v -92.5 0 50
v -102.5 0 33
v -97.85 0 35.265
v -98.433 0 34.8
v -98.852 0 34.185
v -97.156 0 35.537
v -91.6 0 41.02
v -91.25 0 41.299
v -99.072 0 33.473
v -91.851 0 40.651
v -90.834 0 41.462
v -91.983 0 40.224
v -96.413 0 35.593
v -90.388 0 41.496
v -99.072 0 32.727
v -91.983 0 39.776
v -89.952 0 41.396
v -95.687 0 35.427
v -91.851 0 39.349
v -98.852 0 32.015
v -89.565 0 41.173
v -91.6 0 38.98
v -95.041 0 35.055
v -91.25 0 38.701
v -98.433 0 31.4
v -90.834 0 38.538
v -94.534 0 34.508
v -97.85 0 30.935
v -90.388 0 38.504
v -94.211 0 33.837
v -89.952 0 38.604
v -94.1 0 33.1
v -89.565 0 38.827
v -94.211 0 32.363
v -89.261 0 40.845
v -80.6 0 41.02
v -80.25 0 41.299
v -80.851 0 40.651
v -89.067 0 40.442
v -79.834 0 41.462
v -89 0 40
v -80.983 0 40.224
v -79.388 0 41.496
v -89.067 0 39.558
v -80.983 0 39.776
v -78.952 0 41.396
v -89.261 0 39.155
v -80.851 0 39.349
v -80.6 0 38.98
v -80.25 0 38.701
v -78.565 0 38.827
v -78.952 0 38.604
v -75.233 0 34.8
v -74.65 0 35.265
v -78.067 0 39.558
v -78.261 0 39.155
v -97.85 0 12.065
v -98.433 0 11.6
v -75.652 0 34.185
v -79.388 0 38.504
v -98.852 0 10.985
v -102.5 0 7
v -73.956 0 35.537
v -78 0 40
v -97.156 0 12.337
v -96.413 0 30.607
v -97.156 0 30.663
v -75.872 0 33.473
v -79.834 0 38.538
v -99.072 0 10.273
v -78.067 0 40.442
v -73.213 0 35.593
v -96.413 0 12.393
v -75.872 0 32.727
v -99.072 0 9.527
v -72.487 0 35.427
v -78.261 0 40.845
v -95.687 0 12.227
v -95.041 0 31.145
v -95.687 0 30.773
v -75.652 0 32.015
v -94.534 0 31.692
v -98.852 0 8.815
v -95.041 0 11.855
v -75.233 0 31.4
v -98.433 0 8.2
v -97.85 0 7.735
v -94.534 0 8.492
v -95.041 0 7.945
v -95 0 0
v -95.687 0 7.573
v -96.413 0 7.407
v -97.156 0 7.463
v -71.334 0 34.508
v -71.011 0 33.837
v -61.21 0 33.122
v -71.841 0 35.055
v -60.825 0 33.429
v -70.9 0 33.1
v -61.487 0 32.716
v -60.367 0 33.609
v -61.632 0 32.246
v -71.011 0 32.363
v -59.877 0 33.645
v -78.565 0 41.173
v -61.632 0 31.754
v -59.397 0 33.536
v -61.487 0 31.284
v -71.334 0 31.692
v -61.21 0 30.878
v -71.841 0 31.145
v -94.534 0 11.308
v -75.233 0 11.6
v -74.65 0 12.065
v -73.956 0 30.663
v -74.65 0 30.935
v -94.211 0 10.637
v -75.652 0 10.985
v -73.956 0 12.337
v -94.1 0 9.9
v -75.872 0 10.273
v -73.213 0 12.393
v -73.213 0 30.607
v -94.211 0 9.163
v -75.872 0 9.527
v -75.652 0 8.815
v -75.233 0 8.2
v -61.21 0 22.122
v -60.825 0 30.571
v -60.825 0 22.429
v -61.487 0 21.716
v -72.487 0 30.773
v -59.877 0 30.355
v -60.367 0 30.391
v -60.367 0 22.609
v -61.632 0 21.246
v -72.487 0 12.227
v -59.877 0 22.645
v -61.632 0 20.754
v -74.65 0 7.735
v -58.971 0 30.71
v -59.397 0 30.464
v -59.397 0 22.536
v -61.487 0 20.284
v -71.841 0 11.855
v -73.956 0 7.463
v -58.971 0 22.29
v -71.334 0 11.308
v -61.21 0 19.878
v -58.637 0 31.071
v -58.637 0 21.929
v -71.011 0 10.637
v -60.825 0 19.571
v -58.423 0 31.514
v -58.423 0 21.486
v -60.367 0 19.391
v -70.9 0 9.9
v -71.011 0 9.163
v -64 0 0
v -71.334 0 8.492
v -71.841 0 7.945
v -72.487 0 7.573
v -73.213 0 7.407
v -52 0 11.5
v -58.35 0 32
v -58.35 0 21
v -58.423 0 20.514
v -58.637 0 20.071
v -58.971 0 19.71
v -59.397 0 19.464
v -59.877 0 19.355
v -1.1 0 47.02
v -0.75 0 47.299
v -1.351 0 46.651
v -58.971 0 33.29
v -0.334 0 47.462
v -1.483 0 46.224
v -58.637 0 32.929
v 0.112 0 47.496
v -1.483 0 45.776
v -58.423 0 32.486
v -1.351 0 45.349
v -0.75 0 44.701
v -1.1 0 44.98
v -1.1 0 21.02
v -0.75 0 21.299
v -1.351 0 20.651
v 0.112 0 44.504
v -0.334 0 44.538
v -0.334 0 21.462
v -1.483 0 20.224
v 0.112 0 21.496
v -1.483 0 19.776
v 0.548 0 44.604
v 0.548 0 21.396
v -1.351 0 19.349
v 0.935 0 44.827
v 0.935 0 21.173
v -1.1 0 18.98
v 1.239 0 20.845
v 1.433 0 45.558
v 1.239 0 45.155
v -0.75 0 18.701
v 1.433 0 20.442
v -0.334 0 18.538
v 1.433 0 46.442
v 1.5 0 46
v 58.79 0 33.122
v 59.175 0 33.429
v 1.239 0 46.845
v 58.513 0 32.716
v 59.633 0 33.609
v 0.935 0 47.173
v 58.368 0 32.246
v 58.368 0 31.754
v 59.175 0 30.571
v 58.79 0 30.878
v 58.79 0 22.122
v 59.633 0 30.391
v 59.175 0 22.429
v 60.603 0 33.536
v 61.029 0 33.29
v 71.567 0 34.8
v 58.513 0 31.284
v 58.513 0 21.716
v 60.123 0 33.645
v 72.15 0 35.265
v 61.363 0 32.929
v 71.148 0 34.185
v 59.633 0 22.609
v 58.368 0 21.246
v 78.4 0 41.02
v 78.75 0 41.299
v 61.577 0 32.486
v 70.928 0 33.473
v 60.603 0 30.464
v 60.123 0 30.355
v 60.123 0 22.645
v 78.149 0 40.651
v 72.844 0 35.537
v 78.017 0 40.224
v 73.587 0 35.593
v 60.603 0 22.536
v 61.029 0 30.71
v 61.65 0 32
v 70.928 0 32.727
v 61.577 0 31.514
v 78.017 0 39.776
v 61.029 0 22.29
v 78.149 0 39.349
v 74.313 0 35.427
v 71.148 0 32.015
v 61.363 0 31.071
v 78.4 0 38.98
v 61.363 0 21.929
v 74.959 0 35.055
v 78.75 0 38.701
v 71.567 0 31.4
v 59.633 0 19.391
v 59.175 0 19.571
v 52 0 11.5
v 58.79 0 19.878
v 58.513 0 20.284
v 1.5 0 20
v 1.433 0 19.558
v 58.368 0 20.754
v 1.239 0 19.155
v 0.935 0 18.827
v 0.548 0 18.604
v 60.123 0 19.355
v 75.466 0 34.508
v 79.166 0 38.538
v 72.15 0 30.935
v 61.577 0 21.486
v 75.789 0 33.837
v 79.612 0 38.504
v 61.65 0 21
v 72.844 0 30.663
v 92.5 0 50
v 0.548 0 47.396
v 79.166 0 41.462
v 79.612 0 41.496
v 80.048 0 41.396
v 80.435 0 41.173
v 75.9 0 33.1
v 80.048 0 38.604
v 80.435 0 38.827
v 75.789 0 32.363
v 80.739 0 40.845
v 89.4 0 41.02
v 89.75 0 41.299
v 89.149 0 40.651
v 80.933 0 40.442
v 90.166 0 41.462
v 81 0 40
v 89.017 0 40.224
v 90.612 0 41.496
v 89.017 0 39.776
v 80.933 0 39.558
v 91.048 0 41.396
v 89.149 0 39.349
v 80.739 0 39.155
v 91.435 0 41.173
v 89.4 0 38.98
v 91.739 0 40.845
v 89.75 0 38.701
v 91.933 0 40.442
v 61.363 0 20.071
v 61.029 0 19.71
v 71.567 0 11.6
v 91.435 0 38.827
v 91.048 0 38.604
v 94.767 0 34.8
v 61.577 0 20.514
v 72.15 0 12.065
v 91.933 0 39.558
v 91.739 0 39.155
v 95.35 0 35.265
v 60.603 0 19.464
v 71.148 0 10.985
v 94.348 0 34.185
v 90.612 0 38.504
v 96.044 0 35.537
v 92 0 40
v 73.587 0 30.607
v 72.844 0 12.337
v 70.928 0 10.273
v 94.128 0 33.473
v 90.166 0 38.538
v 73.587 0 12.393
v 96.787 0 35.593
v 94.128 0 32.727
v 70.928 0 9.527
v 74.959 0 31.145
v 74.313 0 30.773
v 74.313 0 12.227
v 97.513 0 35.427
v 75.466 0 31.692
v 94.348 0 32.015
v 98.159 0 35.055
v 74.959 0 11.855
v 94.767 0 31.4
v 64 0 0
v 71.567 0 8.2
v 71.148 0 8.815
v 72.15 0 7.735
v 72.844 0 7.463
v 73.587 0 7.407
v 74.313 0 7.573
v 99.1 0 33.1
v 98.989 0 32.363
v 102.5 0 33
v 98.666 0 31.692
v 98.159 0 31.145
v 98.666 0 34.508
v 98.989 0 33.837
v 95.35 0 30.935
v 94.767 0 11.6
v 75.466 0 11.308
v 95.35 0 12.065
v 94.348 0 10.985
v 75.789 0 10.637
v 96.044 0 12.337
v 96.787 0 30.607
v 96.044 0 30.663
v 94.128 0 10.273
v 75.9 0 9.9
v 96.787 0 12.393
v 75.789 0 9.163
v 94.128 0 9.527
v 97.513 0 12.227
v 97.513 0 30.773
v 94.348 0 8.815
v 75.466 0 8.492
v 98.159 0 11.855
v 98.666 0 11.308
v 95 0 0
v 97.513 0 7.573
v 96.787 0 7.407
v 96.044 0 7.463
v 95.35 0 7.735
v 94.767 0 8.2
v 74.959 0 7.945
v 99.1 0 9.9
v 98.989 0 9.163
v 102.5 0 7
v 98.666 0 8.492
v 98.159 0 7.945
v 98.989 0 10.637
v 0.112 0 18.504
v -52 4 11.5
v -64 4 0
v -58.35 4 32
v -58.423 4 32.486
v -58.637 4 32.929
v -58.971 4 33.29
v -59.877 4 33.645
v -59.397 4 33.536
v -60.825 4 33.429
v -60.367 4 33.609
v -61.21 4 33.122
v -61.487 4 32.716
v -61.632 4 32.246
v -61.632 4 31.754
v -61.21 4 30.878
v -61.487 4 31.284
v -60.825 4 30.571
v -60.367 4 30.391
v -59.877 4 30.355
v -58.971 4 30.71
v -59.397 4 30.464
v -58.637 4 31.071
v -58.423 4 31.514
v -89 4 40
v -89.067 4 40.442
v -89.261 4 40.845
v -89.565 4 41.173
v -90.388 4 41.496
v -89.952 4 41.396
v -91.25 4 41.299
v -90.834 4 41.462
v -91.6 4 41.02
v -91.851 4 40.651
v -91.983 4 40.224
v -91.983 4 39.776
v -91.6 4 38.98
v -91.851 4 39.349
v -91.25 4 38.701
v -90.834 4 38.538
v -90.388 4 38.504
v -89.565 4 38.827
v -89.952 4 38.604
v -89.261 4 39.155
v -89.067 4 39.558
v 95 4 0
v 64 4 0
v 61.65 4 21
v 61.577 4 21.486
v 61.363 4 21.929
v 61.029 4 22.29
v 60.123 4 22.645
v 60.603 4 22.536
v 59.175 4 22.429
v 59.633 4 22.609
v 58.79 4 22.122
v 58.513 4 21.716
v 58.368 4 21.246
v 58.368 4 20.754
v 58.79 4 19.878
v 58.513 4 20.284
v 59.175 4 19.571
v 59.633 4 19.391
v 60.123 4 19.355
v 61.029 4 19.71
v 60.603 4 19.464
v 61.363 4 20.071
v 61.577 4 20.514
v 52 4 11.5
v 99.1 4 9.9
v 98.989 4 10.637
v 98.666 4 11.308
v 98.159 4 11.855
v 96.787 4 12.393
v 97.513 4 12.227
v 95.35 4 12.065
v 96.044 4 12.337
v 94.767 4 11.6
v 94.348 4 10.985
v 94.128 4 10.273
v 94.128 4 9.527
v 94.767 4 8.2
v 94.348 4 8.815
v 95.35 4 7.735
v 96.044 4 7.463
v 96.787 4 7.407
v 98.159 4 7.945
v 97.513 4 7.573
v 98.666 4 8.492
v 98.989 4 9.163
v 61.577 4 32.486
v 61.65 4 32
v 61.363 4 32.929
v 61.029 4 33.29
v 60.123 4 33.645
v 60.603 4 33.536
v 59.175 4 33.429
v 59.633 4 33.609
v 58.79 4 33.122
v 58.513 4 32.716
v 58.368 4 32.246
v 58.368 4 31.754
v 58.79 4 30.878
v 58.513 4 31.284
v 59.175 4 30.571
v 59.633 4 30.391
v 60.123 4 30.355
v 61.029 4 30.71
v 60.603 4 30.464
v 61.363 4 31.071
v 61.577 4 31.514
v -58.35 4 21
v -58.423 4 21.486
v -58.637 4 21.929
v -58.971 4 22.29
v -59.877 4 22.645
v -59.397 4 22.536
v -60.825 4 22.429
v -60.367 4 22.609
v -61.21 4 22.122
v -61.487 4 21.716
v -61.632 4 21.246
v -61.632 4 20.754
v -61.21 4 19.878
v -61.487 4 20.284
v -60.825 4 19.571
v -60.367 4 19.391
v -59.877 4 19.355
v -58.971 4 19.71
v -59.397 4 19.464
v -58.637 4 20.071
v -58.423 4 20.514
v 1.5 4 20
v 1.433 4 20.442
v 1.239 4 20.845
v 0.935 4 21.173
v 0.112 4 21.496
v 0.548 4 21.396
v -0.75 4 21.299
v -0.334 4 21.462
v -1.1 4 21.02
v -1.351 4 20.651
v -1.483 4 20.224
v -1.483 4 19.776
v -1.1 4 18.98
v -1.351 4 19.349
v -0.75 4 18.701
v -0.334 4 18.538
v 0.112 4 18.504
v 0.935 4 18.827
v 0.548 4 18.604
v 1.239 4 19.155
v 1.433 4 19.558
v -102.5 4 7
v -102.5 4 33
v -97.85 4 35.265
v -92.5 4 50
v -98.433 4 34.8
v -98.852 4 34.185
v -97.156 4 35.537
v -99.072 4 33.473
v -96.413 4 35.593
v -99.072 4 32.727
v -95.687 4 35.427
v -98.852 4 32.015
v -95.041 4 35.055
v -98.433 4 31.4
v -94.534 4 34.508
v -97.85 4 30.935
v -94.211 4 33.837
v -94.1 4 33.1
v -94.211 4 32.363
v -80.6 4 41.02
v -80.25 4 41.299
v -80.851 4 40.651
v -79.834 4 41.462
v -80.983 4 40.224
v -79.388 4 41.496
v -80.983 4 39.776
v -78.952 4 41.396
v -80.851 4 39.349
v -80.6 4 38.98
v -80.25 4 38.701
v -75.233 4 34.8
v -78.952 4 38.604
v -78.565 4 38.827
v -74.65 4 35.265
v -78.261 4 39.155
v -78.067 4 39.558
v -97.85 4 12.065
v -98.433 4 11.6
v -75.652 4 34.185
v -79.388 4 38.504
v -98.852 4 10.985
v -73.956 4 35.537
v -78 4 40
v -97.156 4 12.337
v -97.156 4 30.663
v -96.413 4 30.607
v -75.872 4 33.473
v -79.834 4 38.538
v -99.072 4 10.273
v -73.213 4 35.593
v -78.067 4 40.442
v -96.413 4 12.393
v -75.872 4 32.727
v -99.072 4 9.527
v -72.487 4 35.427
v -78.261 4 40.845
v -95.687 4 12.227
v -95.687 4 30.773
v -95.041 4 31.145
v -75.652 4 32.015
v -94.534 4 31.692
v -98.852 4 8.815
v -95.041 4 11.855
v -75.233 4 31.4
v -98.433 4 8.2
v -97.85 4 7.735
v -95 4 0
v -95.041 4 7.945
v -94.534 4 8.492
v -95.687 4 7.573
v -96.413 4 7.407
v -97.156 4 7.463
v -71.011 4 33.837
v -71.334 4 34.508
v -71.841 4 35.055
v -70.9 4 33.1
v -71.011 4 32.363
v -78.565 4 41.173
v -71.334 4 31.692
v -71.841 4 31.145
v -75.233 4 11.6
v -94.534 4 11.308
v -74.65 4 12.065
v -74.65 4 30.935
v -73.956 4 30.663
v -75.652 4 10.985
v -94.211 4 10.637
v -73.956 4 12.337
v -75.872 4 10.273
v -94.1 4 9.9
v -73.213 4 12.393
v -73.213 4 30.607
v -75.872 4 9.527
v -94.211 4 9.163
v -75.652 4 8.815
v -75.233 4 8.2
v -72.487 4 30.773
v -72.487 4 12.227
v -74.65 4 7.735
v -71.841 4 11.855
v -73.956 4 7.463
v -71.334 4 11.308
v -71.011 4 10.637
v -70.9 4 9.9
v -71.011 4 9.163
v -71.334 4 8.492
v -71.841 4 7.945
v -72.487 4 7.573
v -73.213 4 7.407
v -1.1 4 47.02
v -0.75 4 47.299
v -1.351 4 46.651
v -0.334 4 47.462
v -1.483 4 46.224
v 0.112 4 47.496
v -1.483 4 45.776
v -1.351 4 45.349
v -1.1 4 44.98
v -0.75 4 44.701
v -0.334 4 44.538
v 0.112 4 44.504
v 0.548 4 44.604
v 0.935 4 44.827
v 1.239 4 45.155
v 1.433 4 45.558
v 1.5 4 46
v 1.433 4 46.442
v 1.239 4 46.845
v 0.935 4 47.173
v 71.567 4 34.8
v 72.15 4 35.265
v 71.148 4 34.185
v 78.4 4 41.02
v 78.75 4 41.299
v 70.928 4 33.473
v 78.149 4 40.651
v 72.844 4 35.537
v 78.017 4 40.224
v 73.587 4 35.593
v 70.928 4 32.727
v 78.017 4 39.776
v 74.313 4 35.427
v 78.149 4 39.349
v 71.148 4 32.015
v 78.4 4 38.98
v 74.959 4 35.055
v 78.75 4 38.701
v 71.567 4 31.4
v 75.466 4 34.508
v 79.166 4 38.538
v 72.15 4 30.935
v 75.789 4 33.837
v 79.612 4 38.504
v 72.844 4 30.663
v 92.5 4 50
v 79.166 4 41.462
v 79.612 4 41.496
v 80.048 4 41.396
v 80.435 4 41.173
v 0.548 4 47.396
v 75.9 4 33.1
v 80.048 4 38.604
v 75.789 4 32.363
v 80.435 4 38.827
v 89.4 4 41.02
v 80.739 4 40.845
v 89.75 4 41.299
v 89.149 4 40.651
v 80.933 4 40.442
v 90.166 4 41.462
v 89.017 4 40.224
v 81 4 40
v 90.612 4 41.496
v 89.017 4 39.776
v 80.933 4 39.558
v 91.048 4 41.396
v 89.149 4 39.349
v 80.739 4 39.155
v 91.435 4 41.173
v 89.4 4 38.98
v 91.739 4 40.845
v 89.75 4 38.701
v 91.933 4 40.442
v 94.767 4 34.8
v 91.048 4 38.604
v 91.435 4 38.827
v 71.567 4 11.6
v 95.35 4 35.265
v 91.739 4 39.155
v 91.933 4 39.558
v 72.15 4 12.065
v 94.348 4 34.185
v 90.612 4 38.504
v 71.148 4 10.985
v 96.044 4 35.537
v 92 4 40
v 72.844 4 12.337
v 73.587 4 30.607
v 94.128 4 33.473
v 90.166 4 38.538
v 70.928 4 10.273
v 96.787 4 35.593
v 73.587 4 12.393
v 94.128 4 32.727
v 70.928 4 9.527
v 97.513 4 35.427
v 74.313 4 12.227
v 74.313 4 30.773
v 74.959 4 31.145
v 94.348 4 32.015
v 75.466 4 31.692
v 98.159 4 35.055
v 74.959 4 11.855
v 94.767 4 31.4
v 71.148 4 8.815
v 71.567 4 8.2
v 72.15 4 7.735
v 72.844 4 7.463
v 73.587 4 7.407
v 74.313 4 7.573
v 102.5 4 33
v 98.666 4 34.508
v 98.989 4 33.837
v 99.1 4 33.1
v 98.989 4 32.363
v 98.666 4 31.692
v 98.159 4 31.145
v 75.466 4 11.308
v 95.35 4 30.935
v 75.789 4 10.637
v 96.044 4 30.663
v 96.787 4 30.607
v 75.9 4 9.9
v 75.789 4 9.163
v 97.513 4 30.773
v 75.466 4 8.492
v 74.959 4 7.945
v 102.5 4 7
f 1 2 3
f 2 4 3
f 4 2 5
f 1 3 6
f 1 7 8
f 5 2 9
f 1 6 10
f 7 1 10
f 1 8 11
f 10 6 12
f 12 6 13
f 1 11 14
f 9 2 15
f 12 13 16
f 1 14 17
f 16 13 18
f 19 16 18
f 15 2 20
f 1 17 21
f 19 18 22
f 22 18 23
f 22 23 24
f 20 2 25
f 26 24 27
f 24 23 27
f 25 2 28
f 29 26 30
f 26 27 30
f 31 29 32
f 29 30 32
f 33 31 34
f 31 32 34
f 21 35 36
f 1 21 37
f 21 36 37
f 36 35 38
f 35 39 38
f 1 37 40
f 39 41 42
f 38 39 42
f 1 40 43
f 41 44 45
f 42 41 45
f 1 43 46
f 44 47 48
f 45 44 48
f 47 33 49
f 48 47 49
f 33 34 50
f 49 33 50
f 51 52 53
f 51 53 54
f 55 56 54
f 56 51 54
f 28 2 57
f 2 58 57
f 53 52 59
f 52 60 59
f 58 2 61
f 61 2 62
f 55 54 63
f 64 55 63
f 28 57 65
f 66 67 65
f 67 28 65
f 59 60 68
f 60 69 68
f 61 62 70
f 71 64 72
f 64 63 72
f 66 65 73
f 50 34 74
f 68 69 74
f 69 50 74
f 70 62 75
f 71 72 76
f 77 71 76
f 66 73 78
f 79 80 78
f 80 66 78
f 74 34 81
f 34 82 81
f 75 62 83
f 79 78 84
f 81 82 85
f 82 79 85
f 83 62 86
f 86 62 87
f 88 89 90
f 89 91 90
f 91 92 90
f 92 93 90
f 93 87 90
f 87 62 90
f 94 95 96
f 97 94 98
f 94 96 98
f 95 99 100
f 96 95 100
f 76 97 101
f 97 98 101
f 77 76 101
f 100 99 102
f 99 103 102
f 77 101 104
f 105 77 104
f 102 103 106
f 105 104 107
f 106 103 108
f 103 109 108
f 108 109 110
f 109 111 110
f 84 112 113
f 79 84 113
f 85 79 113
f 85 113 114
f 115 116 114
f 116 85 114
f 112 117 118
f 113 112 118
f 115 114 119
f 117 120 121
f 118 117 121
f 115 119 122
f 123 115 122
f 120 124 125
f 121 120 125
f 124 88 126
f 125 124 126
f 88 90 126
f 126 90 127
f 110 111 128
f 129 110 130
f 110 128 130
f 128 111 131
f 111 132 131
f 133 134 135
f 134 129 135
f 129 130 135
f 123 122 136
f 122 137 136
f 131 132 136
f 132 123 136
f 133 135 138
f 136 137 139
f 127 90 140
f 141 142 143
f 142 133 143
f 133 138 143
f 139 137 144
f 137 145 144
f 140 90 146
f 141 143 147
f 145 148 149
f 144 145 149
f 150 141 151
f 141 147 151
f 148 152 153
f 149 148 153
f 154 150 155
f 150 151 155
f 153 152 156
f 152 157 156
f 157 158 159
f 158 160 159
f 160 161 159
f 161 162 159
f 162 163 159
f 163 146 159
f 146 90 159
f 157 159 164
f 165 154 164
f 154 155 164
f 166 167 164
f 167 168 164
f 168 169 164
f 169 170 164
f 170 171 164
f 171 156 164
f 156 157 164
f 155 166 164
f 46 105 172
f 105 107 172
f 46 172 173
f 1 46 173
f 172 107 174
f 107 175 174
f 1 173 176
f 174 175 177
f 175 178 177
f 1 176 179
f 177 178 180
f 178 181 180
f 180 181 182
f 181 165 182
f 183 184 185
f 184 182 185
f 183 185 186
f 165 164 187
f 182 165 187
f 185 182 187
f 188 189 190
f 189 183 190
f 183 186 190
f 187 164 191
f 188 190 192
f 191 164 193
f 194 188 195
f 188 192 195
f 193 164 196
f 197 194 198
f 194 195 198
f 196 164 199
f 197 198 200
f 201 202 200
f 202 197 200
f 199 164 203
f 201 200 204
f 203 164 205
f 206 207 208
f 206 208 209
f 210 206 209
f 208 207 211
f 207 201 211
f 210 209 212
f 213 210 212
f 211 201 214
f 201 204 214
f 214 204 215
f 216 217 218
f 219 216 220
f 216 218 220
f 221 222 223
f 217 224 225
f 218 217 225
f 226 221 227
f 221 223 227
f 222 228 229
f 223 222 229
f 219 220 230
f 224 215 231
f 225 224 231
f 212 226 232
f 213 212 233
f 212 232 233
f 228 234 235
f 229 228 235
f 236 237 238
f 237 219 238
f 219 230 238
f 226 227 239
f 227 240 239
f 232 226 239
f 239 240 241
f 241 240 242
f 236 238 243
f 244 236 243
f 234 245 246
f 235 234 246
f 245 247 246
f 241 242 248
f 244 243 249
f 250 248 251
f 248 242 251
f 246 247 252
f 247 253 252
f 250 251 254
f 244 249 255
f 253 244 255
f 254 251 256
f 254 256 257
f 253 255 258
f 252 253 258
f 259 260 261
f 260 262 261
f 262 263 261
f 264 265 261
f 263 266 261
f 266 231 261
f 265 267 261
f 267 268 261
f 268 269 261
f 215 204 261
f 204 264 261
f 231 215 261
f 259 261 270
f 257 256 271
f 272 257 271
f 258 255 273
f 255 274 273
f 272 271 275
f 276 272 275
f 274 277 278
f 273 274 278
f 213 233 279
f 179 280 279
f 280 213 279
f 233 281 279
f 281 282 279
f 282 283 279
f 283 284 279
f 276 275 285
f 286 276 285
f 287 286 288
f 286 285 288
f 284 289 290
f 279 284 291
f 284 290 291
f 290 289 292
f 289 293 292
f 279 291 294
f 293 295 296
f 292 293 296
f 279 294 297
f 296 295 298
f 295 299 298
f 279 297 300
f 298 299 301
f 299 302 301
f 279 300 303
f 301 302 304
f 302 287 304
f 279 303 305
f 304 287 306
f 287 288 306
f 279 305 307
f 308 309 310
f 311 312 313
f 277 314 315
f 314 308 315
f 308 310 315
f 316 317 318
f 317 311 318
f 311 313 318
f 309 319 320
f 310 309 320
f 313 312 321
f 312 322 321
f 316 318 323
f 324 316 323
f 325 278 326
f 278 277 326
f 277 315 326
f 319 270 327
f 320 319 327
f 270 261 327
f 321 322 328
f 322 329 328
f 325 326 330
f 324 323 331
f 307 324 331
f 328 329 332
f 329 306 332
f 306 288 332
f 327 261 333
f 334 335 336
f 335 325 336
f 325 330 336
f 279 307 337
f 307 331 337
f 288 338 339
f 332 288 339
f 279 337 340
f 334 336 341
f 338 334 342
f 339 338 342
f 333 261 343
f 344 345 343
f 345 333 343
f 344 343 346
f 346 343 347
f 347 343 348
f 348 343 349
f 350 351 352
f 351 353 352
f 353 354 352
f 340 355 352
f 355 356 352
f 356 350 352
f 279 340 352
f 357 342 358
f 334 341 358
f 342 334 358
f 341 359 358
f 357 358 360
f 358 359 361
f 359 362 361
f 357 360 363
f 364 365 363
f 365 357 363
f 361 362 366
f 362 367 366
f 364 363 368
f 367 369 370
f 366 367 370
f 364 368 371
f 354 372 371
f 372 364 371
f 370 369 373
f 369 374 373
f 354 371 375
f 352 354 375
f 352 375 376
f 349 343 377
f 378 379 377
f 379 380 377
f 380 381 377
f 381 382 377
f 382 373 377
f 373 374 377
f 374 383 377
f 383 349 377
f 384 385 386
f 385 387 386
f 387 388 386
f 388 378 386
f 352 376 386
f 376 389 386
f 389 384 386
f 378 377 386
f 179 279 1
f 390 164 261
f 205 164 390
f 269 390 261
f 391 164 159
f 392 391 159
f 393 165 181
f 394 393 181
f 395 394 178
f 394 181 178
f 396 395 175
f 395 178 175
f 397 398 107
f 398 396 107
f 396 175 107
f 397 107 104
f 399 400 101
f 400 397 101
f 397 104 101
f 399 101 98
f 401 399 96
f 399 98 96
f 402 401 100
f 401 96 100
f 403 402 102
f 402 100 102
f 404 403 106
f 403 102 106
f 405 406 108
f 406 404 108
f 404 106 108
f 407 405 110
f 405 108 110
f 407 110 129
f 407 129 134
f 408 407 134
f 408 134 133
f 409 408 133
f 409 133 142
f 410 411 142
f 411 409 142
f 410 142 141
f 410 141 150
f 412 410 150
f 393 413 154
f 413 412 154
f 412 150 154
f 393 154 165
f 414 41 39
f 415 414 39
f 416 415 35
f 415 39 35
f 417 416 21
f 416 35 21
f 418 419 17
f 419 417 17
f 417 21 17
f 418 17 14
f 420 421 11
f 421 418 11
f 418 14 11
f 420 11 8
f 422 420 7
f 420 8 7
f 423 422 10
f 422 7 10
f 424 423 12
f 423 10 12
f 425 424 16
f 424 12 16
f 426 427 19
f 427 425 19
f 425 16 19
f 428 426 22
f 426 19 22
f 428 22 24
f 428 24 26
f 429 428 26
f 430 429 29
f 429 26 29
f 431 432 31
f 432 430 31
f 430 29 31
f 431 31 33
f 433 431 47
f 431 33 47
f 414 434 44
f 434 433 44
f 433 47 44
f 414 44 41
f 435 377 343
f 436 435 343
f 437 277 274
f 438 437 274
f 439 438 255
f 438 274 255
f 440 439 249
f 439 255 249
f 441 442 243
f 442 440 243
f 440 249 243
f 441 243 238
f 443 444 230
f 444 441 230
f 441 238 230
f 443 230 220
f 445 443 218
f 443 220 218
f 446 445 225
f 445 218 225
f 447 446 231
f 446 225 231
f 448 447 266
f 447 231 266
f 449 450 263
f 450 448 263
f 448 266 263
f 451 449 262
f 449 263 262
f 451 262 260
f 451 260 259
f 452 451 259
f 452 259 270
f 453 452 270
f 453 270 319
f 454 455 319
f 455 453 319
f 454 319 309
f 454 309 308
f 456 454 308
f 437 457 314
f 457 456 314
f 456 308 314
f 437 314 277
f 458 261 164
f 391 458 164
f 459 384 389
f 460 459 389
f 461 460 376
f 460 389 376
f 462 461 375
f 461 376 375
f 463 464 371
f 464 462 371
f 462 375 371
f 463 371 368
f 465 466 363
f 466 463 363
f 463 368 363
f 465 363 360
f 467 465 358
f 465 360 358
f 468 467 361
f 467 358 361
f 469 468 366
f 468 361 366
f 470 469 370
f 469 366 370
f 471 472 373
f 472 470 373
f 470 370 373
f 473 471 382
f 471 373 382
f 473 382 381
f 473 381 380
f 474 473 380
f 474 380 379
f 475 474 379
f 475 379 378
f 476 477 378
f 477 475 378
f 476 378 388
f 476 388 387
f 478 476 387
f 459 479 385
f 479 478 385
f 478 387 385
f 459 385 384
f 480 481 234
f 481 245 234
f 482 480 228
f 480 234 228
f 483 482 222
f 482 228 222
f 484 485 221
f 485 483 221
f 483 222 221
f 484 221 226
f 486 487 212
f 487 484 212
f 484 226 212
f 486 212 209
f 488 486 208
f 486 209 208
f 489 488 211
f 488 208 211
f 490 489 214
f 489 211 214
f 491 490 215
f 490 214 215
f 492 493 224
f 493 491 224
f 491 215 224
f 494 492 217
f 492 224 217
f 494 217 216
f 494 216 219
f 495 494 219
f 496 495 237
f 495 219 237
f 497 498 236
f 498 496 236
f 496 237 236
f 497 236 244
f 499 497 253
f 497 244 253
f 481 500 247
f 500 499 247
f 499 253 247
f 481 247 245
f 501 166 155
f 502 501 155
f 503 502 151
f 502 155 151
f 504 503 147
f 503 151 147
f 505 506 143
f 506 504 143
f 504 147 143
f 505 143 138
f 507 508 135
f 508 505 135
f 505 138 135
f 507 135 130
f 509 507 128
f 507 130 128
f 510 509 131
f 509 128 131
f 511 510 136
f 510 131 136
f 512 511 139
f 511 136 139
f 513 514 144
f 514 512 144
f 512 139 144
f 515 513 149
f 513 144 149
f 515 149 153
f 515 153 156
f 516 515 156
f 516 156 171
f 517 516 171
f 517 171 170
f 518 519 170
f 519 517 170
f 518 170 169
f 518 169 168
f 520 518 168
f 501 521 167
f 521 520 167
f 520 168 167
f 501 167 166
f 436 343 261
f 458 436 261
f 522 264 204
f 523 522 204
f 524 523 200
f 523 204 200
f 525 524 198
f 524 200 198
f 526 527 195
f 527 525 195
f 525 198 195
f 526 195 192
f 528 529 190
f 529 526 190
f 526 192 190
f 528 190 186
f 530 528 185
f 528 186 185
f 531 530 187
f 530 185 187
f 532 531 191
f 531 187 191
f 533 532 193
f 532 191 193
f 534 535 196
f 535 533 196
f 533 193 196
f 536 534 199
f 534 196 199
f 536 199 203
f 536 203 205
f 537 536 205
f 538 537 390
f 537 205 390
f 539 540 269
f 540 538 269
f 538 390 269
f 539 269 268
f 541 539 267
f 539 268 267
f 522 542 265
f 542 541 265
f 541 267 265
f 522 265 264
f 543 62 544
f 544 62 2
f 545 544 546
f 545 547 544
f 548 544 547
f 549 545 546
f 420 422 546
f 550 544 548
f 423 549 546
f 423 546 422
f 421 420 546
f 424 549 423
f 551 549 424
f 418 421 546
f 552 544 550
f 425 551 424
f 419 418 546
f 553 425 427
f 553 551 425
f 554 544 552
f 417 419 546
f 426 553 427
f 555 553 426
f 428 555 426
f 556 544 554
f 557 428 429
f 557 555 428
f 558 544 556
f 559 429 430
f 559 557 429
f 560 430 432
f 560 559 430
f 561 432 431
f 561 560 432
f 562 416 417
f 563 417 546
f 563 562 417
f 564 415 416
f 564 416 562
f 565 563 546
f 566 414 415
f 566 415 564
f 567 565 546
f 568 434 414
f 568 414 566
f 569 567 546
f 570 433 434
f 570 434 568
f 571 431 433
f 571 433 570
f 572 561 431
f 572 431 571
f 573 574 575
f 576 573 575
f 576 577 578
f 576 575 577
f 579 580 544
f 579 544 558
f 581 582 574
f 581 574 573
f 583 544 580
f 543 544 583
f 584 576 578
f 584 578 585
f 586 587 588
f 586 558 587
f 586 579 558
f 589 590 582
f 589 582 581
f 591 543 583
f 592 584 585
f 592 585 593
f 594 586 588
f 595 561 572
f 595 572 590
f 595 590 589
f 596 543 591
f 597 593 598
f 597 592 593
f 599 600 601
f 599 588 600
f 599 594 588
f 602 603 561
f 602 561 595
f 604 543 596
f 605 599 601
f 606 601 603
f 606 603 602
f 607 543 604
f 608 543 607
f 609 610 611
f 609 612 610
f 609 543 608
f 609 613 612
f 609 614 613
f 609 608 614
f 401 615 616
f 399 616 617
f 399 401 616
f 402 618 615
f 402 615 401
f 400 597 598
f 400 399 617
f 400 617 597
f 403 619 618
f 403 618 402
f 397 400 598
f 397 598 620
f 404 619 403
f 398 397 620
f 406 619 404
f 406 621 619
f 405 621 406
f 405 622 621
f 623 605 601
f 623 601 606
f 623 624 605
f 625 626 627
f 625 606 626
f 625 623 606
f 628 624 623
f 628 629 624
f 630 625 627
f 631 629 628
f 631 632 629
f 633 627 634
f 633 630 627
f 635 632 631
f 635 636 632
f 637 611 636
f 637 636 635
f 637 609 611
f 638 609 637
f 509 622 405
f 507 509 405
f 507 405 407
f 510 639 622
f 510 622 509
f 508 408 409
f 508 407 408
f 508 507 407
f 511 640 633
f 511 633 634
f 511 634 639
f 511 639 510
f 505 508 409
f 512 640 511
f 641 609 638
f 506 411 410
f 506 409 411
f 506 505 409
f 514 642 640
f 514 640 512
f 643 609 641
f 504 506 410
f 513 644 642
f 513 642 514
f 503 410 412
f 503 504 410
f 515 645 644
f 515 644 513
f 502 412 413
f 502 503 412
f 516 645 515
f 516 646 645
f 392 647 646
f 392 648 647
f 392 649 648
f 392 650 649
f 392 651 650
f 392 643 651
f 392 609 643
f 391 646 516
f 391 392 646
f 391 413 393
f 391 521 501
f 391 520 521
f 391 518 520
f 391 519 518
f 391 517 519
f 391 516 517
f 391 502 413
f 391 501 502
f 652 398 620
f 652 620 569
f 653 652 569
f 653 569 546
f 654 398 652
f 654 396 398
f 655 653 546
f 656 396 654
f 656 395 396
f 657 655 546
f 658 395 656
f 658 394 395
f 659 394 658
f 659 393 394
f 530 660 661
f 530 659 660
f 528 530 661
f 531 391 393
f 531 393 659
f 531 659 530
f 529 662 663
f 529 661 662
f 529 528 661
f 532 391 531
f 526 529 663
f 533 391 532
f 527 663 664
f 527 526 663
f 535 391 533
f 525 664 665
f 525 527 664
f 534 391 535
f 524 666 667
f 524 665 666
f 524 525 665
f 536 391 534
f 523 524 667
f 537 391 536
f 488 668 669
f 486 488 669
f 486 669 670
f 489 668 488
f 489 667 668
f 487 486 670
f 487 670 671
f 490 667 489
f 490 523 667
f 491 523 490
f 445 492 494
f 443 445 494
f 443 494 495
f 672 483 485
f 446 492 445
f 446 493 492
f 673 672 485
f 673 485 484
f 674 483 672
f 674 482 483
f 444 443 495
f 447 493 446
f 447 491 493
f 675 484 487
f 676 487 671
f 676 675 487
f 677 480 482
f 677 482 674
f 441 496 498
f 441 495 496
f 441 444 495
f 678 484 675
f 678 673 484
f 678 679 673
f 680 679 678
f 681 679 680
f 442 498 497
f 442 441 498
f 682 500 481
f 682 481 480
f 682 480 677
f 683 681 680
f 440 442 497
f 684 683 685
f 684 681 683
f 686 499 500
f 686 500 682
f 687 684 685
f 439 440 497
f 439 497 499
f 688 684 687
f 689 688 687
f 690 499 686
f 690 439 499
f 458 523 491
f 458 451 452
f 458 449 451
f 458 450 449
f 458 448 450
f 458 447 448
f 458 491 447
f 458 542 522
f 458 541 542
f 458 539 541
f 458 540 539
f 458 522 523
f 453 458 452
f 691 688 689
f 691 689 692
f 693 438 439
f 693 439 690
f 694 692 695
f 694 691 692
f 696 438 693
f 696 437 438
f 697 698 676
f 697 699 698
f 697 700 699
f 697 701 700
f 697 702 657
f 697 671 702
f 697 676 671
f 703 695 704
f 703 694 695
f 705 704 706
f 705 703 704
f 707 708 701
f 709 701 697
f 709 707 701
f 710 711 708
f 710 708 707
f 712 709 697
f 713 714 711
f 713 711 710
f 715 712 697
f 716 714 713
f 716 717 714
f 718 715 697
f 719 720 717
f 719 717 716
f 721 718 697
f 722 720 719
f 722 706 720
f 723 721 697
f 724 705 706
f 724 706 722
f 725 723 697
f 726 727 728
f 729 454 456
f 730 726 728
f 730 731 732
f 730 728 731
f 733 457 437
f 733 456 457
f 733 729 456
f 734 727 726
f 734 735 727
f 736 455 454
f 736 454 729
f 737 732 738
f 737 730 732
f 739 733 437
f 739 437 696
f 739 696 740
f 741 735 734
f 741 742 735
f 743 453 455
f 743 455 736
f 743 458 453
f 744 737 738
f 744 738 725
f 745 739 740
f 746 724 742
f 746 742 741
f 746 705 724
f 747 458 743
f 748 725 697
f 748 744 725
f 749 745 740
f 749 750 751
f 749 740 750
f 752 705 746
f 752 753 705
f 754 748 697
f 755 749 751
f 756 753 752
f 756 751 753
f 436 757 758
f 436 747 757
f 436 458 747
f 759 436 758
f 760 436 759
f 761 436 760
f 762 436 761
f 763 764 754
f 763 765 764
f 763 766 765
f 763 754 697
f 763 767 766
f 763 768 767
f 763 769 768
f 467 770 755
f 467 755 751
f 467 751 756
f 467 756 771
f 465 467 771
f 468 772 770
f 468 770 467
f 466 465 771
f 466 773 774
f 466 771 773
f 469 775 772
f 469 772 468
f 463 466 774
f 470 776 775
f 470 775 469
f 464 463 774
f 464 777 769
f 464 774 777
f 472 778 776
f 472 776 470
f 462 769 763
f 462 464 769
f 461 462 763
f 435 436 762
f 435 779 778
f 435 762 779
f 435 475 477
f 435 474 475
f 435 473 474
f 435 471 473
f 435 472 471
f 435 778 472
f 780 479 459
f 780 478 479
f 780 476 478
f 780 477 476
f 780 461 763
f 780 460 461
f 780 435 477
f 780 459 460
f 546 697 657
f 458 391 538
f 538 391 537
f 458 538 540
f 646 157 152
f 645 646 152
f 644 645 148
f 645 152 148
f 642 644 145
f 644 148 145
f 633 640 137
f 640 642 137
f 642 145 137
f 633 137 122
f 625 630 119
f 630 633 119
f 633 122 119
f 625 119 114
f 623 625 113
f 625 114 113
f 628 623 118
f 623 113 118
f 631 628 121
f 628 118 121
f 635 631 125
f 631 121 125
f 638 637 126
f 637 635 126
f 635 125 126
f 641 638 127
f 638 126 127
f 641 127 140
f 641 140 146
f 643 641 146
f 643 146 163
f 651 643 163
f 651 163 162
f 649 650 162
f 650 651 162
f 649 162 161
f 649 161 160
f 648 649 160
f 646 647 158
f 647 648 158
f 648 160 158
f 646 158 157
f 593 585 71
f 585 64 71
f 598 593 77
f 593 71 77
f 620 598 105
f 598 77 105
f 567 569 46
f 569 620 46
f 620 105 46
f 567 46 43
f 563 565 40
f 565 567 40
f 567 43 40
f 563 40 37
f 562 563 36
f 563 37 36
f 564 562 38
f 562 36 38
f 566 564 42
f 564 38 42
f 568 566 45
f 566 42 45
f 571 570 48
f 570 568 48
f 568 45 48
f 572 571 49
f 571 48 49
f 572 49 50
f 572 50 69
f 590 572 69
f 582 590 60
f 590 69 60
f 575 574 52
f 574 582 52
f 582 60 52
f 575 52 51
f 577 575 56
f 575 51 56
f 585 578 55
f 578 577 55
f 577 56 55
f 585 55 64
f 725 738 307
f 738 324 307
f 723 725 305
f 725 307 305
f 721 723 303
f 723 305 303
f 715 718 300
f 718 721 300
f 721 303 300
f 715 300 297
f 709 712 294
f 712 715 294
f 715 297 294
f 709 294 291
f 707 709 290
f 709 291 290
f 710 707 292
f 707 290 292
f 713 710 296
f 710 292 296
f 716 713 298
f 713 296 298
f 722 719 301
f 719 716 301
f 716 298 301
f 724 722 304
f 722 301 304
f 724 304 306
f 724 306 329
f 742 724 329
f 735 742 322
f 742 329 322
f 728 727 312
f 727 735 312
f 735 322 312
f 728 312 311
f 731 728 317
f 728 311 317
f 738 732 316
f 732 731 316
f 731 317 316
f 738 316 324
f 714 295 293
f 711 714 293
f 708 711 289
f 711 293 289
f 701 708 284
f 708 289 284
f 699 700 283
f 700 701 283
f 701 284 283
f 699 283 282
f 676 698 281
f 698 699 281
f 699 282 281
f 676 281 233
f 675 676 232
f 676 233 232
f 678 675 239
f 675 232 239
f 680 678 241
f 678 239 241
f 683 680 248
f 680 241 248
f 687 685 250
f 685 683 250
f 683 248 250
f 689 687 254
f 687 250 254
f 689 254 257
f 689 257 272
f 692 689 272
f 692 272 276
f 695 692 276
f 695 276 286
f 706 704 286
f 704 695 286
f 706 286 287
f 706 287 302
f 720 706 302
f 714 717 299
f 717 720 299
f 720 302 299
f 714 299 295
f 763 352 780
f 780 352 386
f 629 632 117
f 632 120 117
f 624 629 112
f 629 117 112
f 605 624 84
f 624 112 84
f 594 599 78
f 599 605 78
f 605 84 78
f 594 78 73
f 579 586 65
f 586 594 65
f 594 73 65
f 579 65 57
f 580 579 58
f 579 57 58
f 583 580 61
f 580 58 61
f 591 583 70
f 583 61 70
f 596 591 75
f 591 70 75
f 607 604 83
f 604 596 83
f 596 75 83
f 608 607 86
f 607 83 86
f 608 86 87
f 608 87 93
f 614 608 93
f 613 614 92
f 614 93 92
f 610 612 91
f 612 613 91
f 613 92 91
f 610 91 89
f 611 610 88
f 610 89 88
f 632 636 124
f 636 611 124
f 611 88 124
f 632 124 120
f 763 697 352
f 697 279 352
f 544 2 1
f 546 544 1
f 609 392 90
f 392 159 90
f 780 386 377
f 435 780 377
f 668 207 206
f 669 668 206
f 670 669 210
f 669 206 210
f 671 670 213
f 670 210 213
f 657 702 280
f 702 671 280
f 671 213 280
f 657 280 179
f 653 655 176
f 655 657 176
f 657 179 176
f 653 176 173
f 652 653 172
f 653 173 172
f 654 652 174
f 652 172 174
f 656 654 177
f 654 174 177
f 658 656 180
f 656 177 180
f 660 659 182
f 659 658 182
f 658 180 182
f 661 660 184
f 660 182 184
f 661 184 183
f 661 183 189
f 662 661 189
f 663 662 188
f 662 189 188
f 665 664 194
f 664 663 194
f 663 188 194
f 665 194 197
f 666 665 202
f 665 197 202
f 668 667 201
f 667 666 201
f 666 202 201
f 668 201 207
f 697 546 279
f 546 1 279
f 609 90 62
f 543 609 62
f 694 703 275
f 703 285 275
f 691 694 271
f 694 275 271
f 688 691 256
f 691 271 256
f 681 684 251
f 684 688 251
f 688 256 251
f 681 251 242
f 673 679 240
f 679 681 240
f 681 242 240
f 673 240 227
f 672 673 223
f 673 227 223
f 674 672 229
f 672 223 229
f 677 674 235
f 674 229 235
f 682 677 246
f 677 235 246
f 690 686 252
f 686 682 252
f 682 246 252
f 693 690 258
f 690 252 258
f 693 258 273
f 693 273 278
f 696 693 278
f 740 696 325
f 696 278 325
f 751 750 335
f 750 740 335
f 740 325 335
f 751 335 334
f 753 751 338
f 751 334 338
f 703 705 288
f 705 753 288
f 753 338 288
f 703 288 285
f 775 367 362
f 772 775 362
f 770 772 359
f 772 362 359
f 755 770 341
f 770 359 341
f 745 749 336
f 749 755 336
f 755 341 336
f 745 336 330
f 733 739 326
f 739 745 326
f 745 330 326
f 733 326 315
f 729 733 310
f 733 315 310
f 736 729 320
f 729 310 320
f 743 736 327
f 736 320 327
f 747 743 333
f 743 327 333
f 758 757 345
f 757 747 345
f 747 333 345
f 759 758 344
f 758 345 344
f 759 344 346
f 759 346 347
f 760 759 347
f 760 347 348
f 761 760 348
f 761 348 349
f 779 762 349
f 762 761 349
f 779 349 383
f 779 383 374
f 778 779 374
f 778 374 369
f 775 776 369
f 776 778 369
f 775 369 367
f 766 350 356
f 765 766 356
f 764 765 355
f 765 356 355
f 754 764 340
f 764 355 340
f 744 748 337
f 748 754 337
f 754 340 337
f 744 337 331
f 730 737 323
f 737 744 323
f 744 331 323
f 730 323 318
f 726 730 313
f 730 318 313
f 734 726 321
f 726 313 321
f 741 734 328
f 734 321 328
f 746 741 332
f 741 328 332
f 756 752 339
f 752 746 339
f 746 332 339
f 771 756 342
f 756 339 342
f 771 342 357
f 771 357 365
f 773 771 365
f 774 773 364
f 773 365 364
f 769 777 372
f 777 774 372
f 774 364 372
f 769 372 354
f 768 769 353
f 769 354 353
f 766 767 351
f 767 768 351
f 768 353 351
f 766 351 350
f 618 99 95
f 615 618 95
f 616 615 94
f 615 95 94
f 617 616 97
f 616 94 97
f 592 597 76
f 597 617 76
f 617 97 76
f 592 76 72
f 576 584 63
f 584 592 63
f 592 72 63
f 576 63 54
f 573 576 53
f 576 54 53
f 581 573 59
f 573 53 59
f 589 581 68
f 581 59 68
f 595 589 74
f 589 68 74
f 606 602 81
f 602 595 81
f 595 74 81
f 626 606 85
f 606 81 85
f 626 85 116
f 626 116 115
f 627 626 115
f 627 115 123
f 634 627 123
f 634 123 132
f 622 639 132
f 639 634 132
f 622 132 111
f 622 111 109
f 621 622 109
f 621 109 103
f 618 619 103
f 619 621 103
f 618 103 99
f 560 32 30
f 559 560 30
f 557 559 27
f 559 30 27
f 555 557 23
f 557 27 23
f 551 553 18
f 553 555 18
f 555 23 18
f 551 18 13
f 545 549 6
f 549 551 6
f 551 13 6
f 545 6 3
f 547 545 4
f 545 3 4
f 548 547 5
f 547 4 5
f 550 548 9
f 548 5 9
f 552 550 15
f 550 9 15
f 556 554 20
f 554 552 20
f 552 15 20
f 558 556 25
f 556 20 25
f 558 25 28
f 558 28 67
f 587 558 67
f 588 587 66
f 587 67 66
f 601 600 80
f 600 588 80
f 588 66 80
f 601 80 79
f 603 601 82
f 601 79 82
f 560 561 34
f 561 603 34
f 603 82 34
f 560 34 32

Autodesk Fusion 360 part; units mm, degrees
sketch "MK3-front-plate" plane through (0, 0, 0) normal (0, 1, 0) x (1, 0, 0)
  line L0 (-64, 0) -> (-95, 0)
  line L1 (-95, 0) -> (-102.5, -7)
  line L2 (-102.5, -7) -> (-102.5, -33)
  line L3 (-102.5, -33) -> (-92.5, -50)
  line L4 (-92.5, -50) -> (92.5, -50)
  line L5 (102.5, -33) -> (102.5, -7)
  line L6 (64, 0) -> (52, -11.5)
  line L7 (102.5, -7) -> (95, 0)
  line L8 (-52, -11.5) -> (-64, 0)
  line L9 (95, 0) -> (64, 0)
  line L10 (52, -11.5) -> (-52, -11.5)
  line L11 (92.5, -50) -> (102.5, -33)
  line L12 (-64, 0) -> (64, 0) construction
  line L13 (-73.4, 0) -> (-73.4, -50) construction
  line L14 (-96.6, 0) -> (-96.6, -50) construction
  circle A0 centre (-73.4, -9.9) radius 2.5
  circle A1 centre (-96.6, -9.9) radius 2.5
  circle A2 centre (-73.4, -33.1) radius 2.5
  circle A3 centre (-96.6, -33.1) radius 2.5
  line L15 (-96.6, -40) -> (-73.4, -40) construction
  circle A4 centre (-90.5, -40) radius 1.5
  circle A5 centre (-79.5, -40) radius 1.5
  circle A6 centre (0, -46) radius 1.5
  line L16 (0, 0) -> (0, -50) construction
  circle A7 centre (0, -20) radius 1.5
  line L17 (-60, -21) -> (-60, -32) construction
  circle A8 centre (-60, -21) radius 1.65
  circle A9 centre (-60, -32) radius 1.65
  circle A10 centre (60, -32) radius 1.65
  circle A11 centre (60, -21) radius 1.65
  circle A12 centre (73.4, -9.9) radius 2.5
  circle A13 centre (96.6, -9.9) radius 2.5
  circle A14 centre (96.6, -33.1) radius 2.5
  circle A15 centre (73.4, -33.1) radius 2.5
  circle A16 centre (79.5, -40) radius 1.5
  circle A17 centre (90.5, -40) radius 1.5
  line L18 (0, -33.1) -> (-102.5, -33.1) construction
  line L19 (-102.5, -9.9) -> (0, -9.9) construction
  dimension "d3" = 50
  dimension "d4" = 205
  dimension "d5" = 7.5
  dimension "d12" = 10
  dimension "d16" = 17
  dimension "d26" = 5
  dimension "d27" = 5
  dimension "d28" = 5
  dimension "d29" = 5
  dimension "d37" = 3
  dimension "d40" = 3
  dimension "d46" = 4
  dimension "d48" = 3
  dimension "d49" = 3
  dimension "d50" = 10
  dimension "d51" = 16.9
  dimension "d52" = 3.3
  dimension "d53" = 3.3
  dimension "d54" = 18
  dimension "d56" = 42.5
  dimension "d57" = 5.9
  dimension "d58" = 29.1
  dimension "d59" = 40.1
  dimension "d60" = 102.5
  dimension "d61" = 43
  dimension "d62" = 29
  dimension "d63" = 12
  dimension "d64" = 23
  dimension "d65" = 50.5
  dimension "d66" = 12
  dimension "d67" = 38.5
  dimension "d68" = 30
extrude "Extrude1" add sketch "MK3-front-plate" along normal blind 4
